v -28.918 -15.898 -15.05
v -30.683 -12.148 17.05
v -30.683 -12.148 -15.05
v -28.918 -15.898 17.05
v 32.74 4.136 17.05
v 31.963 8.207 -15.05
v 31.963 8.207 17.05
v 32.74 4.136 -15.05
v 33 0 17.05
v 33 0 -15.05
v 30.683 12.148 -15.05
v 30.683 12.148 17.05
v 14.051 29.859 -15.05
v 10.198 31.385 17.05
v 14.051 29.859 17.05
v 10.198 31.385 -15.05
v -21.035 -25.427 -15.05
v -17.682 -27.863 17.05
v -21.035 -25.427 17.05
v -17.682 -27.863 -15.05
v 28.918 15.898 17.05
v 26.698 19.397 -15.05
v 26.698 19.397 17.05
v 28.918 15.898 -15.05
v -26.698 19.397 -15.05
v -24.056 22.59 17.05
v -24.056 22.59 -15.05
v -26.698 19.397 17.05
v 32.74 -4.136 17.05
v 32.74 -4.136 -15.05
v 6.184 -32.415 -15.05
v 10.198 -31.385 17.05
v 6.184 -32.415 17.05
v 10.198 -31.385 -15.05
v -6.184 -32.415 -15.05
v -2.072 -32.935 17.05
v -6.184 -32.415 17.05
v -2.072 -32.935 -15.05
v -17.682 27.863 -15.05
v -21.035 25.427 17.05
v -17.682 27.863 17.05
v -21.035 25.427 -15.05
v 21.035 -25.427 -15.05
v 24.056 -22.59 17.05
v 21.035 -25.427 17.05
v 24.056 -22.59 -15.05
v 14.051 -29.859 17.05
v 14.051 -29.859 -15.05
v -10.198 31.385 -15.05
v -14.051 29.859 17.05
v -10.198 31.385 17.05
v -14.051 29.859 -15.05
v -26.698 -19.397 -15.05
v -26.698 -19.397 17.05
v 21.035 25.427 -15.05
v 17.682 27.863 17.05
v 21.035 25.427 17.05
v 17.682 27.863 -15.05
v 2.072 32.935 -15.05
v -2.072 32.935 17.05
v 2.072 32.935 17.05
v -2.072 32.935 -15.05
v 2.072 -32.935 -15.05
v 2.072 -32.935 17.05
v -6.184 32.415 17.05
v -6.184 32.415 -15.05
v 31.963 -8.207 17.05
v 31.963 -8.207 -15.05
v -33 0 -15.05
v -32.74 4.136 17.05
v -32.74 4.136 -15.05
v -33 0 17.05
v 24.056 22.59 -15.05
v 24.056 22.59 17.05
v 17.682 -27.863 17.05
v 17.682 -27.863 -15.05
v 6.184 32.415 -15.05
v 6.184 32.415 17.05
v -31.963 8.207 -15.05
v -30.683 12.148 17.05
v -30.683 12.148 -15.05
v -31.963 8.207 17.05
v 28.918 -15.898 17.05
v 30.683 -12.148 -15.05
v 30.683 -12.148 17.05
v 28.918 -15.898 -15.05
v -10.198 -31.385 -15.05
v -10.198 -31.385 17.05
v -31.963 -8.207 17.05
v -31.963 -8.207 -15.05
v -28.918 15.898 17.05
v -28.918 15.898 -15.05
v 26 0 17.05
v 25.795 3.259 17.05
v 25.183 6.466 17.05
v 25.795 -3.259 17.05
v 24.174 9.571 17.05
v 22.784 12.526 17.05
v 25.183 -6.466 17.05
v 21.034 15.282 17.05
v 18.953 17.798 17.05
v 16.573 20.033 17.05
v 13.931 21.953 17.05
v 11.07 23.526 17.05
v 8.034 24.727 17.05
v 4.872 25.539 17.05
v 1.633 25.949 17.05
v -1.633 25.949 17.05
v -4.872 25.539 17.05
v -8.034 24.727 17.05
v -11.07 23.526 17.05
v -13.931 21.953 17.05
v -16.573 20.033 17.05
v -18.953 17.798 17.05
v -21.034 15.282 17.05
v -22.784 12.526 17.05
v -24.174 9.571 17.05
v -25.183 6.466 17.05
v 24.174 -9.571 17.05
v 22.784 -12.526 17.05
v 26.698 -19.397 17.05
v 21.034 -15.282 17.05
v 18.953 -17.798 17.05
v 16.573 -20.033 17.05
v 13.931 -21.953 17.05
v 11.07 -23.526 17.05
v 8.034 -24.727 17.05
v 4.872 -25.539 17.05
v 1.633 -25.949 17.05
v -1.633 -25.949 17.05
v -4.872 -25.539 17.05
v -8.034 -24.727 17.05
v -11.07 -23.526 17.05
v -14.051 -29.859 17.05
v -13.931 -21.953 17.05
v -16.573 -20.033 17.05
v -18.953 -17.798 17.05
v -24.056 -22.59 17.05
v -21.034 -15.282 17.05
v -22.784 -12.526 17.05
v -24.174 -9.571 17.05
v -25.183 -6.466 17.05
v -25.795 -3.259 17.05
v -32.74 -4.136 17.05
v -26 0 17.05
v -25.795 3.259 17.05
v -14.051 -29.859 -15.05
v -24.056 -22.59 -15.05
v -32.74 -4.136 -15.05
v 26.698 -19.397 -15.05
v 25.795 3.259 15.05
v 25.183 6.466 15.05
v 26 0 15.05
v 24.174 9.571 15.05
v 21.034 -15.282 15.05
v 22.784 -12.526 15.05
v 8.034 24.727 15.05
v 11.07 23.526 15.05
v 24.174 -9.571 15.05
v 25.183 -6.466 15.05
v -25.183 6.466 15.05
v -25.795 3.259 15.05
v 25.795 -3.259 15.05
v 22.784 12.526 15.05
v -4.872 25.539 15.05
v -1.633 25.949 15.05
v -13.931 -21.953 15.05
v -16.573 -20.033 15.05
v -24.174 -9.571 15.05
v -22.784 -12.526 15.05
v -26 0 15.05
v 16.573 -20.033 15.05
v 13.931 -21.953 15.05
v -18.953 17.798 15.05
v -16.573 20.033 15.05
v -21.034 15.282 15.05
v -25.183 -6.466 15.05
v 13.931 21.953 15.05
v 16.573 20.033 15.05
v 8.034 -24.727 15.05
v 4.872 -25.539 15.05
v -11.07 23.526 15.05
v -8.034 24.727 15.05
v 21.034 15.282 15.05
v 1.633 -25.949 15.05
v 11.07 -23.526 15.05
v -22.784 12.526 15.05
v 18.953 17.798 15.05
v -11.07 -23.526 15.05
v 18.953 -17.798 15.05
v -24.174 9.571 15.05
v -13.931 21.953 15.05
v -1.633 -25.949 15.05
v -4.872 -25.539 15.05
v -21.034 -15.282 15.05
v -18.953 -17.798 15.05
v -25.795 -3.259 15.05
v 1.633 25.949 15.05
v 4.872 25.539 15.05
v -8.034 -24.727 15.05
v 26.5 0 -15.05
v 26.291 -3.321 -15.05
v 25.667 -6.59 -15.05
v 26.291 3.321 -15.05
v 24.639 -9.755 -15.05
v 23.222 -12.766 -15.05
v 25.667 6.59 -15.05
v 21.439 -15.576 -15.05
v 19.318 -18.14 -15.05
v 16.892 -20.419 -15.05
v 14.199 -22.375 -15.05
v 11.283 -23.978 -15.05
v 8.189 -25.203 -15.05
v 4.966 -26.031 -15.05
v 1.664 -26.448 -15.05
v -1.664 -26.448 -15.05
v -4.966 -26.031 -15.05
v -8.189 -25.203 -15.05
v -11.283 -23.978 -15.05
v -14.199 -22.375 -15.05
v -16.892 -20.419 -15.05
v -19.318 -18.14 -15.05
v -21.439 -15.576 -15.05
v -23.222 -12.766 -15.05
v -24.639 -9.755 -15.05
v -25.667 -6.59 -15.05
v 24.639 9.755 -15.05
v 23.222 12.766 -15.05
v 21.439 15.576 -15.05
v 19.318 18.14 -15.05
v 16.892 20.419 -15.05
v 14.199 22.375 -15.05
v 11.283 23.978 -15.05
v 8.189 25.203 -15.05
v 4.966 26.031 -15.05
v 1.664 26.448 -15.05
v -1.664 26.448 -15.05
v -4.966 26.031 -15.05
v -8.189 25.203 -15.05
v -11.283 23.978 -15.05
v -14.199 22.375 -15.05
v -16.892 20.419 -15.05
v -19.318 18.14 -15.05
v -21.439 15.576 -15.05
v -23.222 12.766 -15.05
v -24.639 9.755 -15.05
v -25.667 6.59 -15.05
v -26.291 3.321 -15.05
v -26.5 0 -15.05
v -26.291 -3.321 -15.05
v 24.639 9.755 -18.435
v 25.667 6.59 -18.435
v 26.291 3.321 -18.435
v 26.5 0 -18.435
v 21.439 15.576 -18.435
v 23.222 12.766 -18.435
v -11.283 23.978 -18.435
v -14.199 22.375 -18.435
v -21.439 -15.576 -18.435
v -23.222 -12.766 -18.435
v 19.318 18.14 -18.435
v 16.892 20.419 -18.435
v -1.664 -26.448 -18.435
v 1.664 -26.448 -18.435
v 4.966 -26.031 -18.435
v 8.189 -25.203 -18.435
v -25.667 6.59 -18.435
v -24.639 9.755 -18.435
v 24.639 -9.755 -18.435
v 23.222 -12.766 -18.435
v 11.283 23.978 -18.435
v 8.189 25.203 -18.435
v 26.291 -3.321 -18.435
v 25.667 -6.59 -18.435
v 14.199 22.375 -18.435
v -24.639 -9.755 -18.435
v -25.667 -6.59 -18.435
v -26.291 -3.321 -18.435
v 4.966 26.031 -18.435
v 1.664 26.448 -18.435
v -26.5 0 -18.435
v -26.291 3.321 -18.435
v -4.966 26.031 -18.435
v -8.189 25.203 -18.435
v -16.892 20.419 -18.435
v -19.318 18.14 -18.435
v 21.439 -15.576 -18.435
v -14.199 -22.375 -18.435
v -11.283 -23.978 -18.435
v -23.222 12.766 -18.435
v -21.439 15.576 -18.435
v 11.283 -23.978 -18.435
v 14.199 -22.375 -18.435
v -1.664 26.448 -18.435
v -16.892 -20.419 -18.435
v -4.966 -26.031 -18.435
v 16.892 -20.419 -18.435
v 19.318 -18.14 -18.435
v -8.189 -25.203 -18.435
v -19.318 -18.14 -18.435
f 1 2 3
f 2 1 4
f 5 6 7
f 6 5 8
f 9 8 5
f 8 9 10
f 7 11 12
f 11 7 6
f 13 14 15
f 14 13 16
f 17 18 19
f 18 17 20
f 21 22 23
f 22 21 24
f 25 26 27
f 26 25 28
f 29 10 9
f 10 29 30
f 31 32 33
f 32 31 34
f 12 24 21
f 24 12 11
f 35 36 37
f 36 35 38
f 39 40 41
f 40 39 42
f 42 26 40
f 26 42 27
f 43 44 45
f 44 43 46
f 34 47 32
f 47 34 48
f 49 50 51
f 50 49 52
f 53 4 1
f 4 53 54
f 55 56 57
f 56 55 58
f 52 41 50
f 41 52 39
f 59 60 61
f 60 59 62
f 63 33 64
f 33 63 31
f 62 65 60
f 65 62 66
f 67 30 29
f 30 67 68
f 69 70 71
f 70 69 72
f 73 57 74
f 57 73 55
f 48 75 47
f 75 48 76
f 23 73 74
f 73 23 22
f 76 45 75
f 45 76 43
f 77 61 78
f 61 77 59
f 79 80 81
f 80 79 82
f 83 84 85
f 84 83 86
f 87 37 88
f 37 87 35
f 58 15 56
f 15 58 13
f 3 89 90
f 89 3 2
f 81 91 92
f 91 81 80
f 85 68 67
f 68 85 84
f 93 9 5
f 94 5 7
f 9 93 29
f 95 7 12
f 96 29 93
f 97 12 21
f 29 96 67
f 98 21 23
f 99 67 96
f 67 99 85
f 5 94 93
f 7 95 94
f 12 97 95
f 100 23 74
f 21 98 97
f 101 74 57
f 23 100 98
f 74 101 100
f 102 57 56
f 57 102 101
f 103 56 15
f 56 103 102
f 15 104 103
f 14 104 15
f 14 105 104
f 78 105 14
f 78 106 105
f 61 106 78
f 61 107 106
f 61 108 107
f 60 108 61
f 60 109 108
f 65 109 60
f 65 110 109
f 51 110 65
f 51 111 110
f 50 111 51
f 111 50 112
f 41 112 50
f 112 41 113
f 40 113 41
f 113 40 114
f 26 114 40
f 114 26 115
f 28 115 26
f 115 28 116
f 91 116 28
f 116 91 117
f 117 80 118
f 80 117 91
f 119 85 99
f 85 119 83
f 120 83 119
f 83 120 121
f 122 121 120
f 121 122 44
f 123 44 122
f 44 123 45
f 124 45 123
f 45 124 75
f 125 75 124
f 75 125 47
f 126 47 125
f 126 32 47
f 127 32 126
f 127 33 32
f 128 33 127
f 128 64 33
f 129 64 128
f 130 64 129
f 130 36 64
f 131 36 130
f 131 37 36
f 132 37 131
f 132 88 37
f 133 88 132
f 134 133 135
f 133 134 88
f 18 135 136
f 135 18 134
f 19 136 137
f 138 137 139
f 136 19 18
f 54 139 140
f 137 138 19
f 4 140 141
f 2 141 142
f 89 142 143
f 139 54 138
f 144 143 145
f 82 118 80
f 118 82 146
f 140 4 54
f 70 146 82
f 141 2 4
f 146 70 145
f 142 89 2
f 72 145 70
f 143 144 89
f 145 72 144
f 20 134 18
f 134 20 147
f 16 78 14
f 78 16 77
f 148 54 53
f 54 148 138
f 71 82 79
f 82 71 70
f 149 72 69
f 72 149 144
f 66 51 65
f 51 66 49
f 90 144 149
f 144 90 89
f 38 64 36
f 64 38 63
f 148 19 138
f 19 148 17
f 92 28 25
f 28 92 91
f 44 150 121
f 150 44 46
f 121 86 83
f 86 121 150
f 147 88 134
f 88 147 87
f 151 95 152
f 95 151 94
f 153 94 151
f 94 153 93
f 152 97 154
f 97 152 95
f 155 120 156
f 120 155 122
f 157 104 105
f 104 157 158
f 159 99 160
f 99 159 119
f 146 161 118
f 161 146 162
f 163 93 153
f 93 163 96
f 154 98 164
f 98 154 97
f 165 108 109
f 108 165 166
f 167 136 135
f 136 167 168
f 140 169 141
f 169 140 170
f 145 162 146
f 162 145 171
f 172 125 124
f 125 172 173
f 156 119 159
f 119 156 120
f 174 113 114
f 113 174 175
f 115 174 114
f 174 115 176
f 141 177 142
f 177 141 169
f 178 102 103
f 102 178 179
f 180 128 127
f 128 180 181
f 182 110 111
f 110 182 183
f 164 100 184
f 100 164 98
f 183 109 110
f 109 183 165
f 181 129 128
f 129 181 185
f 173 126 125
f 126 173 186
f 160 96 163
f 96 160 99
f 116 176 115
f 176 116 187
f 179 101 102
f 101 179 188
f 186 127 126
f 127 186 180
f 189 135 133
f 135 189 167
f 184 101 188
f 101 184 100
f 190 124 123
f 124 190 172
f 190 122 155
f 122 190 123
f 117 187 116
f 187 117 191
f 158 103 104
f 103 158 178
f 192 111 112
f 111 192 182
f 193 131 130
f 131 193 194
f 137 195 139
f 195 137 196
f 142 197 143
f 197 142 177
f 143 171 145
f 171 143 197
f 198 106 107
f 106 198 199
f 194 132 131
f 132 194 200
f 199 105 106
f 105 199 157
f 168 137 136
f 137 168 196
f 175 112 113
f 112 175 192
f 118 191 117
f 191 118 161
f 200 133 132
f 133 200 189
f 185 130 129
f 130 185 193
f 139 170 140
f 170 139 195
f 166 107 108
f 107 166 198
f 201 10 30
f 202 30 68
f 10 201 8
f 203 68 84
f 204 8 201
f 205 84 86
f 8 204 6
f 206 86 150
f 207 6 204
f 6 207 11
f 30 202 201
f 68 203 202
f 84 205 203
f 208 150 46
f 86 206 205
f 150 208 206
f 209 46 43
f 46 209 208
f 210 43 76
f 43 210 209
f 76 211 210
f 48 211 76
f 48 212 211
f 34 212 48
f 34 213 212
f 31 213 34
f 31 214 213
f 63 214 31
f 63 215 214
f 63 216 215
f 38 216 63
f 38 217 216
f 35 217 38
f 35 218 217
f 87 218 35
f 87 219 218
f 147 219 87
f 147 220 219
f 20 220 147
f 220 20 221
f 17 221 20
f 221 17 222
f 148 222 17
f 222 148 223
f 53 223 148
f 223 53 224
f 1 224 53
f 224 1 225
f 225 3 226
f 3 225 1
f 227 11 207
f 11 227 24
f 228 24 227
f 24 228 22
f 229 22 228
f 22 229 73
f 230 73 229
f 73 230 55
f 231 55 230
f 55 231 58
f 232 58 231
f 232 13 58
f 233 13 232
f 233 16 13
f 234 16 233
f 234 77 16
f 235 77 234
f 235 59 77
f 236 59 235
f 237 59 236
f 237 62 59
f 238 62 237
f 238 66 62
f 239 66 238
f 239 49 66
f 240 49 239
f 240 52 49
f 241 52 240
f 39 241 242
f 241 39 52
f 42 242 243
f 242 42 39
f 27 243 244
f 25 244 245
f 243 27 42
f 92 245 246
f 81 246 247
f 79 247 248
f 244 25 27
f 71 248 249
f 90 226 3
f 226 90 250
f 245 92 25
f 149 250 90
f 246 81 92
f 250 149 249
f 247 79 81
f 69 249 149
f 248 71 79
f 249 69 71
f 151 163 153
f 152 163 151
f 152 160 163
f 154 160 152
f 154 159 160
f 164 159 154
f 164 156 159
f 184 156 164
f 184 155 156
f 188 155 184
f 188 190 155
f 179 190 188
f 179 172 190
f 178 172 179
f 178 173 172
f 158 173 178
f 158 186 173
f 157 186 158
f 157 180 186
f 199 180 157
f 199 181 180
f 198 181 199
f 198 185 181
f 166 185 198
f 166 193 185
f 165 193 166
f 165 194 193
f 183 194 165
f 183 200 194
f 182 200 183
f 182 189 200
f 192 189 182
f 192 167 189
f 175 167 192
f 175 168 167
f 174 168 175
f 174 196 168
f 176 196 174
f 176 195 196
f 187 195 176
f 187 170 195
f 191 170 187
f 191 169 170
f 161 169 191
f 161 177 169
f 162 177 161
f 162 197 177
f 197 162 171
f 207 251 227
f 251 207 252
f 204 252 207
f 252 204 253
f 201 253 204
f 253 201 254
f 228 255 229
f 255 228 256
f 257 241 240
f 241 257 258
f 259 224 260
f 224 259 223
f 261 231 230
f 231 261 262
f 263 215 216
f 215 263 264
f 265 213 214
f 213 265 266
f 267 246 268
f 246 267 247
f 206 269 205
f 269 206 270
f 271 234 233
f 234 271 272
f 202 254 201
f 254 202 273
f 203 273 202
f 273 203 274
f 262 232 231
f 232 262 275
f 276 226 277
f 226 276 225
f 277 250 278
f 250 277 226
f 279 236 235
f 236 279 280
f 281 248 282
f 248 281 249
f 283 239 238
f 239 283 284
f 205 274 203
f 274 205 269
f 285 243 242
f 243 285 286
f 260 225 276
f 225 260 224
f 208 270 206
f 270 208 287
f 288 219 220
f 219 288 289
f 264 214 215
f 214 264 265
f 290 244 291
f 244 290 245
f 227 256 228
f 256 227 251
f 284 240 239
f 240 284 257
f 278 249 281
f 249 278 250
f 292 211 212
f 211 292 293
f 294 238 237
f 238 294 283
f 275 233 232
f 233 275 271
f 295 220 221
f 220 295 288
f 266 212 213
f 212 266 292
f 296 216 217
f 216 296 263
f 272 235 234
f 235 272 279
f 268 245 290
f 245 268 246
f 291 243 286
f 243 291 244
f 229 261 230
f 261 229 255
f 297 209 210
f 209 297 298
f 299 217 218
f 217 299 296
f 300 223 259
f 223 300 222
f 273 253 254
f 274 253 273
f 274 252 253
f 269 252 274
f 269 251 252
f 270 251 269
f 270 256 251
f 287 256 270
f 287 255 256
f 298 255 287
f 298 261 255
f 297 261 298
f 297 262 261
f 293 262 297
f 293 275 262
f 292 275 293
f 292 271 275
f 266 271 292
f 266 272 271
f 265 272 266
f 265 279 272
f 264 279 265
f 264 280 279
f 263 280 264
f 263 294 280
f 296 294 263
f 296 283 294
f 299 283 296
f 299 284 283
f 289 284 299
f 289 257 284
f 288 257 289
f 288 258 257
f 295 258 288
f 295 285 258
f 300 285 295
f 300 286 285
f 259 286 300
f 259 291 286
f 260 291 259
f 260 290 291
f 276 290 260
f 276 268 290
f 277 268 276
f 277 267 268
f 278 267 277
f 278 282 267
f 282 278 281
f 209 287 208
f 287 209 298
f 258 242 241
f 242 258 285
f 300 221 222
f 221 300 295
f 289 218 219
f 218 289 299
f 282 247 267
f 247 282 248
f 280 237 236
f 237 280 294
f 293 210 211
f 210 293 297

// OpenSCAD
fn=50;
can_od = 66.0;

short_can_height = 92.3;
regular_can_height = 122.4;

can_lower_flange_height = 6.77;
can_lower_flange_inset = 6.6;
can_lower_flange_id = 42.0;
can_lower_flange_od = 53.0;

can_upper_flange_id = 52.0;
can_upper_flange_od = can_od;
can_upper_flange_height =4;

adapter_height = regular_can_height - short_can_height;
// adapter_height_body = adapter_height-(can_upper_flange_height+can_lower_flange_height);
adapter_height_body = adapter_height;

// difference() {
  cylinder(d=can_od, h=adapter_height_body, center=true, $fn=fn);
  translate([0,0,adapter_height_body/2]) {
    difference() {
      cylinder(d=can_upper_flange_od, h=can_upper_flange_height, center=true, $fn=fn);
      cylinder(d=can_upper_flange_id, h=can_upper_flange_height, center=true, $fn=fn);
    }
  }
  translate([0,0,-(adapter_height_body/2)]) {
    // difference() {
      cylinder(d=can_lower_flange_od, h=can_lower_flange_height, center=true, $fn=fn);
      // cylinder(d=can_lower_flange_id, h=can_lower_flange_height, center=true, $fn=fn);
    // }
  }
// }
